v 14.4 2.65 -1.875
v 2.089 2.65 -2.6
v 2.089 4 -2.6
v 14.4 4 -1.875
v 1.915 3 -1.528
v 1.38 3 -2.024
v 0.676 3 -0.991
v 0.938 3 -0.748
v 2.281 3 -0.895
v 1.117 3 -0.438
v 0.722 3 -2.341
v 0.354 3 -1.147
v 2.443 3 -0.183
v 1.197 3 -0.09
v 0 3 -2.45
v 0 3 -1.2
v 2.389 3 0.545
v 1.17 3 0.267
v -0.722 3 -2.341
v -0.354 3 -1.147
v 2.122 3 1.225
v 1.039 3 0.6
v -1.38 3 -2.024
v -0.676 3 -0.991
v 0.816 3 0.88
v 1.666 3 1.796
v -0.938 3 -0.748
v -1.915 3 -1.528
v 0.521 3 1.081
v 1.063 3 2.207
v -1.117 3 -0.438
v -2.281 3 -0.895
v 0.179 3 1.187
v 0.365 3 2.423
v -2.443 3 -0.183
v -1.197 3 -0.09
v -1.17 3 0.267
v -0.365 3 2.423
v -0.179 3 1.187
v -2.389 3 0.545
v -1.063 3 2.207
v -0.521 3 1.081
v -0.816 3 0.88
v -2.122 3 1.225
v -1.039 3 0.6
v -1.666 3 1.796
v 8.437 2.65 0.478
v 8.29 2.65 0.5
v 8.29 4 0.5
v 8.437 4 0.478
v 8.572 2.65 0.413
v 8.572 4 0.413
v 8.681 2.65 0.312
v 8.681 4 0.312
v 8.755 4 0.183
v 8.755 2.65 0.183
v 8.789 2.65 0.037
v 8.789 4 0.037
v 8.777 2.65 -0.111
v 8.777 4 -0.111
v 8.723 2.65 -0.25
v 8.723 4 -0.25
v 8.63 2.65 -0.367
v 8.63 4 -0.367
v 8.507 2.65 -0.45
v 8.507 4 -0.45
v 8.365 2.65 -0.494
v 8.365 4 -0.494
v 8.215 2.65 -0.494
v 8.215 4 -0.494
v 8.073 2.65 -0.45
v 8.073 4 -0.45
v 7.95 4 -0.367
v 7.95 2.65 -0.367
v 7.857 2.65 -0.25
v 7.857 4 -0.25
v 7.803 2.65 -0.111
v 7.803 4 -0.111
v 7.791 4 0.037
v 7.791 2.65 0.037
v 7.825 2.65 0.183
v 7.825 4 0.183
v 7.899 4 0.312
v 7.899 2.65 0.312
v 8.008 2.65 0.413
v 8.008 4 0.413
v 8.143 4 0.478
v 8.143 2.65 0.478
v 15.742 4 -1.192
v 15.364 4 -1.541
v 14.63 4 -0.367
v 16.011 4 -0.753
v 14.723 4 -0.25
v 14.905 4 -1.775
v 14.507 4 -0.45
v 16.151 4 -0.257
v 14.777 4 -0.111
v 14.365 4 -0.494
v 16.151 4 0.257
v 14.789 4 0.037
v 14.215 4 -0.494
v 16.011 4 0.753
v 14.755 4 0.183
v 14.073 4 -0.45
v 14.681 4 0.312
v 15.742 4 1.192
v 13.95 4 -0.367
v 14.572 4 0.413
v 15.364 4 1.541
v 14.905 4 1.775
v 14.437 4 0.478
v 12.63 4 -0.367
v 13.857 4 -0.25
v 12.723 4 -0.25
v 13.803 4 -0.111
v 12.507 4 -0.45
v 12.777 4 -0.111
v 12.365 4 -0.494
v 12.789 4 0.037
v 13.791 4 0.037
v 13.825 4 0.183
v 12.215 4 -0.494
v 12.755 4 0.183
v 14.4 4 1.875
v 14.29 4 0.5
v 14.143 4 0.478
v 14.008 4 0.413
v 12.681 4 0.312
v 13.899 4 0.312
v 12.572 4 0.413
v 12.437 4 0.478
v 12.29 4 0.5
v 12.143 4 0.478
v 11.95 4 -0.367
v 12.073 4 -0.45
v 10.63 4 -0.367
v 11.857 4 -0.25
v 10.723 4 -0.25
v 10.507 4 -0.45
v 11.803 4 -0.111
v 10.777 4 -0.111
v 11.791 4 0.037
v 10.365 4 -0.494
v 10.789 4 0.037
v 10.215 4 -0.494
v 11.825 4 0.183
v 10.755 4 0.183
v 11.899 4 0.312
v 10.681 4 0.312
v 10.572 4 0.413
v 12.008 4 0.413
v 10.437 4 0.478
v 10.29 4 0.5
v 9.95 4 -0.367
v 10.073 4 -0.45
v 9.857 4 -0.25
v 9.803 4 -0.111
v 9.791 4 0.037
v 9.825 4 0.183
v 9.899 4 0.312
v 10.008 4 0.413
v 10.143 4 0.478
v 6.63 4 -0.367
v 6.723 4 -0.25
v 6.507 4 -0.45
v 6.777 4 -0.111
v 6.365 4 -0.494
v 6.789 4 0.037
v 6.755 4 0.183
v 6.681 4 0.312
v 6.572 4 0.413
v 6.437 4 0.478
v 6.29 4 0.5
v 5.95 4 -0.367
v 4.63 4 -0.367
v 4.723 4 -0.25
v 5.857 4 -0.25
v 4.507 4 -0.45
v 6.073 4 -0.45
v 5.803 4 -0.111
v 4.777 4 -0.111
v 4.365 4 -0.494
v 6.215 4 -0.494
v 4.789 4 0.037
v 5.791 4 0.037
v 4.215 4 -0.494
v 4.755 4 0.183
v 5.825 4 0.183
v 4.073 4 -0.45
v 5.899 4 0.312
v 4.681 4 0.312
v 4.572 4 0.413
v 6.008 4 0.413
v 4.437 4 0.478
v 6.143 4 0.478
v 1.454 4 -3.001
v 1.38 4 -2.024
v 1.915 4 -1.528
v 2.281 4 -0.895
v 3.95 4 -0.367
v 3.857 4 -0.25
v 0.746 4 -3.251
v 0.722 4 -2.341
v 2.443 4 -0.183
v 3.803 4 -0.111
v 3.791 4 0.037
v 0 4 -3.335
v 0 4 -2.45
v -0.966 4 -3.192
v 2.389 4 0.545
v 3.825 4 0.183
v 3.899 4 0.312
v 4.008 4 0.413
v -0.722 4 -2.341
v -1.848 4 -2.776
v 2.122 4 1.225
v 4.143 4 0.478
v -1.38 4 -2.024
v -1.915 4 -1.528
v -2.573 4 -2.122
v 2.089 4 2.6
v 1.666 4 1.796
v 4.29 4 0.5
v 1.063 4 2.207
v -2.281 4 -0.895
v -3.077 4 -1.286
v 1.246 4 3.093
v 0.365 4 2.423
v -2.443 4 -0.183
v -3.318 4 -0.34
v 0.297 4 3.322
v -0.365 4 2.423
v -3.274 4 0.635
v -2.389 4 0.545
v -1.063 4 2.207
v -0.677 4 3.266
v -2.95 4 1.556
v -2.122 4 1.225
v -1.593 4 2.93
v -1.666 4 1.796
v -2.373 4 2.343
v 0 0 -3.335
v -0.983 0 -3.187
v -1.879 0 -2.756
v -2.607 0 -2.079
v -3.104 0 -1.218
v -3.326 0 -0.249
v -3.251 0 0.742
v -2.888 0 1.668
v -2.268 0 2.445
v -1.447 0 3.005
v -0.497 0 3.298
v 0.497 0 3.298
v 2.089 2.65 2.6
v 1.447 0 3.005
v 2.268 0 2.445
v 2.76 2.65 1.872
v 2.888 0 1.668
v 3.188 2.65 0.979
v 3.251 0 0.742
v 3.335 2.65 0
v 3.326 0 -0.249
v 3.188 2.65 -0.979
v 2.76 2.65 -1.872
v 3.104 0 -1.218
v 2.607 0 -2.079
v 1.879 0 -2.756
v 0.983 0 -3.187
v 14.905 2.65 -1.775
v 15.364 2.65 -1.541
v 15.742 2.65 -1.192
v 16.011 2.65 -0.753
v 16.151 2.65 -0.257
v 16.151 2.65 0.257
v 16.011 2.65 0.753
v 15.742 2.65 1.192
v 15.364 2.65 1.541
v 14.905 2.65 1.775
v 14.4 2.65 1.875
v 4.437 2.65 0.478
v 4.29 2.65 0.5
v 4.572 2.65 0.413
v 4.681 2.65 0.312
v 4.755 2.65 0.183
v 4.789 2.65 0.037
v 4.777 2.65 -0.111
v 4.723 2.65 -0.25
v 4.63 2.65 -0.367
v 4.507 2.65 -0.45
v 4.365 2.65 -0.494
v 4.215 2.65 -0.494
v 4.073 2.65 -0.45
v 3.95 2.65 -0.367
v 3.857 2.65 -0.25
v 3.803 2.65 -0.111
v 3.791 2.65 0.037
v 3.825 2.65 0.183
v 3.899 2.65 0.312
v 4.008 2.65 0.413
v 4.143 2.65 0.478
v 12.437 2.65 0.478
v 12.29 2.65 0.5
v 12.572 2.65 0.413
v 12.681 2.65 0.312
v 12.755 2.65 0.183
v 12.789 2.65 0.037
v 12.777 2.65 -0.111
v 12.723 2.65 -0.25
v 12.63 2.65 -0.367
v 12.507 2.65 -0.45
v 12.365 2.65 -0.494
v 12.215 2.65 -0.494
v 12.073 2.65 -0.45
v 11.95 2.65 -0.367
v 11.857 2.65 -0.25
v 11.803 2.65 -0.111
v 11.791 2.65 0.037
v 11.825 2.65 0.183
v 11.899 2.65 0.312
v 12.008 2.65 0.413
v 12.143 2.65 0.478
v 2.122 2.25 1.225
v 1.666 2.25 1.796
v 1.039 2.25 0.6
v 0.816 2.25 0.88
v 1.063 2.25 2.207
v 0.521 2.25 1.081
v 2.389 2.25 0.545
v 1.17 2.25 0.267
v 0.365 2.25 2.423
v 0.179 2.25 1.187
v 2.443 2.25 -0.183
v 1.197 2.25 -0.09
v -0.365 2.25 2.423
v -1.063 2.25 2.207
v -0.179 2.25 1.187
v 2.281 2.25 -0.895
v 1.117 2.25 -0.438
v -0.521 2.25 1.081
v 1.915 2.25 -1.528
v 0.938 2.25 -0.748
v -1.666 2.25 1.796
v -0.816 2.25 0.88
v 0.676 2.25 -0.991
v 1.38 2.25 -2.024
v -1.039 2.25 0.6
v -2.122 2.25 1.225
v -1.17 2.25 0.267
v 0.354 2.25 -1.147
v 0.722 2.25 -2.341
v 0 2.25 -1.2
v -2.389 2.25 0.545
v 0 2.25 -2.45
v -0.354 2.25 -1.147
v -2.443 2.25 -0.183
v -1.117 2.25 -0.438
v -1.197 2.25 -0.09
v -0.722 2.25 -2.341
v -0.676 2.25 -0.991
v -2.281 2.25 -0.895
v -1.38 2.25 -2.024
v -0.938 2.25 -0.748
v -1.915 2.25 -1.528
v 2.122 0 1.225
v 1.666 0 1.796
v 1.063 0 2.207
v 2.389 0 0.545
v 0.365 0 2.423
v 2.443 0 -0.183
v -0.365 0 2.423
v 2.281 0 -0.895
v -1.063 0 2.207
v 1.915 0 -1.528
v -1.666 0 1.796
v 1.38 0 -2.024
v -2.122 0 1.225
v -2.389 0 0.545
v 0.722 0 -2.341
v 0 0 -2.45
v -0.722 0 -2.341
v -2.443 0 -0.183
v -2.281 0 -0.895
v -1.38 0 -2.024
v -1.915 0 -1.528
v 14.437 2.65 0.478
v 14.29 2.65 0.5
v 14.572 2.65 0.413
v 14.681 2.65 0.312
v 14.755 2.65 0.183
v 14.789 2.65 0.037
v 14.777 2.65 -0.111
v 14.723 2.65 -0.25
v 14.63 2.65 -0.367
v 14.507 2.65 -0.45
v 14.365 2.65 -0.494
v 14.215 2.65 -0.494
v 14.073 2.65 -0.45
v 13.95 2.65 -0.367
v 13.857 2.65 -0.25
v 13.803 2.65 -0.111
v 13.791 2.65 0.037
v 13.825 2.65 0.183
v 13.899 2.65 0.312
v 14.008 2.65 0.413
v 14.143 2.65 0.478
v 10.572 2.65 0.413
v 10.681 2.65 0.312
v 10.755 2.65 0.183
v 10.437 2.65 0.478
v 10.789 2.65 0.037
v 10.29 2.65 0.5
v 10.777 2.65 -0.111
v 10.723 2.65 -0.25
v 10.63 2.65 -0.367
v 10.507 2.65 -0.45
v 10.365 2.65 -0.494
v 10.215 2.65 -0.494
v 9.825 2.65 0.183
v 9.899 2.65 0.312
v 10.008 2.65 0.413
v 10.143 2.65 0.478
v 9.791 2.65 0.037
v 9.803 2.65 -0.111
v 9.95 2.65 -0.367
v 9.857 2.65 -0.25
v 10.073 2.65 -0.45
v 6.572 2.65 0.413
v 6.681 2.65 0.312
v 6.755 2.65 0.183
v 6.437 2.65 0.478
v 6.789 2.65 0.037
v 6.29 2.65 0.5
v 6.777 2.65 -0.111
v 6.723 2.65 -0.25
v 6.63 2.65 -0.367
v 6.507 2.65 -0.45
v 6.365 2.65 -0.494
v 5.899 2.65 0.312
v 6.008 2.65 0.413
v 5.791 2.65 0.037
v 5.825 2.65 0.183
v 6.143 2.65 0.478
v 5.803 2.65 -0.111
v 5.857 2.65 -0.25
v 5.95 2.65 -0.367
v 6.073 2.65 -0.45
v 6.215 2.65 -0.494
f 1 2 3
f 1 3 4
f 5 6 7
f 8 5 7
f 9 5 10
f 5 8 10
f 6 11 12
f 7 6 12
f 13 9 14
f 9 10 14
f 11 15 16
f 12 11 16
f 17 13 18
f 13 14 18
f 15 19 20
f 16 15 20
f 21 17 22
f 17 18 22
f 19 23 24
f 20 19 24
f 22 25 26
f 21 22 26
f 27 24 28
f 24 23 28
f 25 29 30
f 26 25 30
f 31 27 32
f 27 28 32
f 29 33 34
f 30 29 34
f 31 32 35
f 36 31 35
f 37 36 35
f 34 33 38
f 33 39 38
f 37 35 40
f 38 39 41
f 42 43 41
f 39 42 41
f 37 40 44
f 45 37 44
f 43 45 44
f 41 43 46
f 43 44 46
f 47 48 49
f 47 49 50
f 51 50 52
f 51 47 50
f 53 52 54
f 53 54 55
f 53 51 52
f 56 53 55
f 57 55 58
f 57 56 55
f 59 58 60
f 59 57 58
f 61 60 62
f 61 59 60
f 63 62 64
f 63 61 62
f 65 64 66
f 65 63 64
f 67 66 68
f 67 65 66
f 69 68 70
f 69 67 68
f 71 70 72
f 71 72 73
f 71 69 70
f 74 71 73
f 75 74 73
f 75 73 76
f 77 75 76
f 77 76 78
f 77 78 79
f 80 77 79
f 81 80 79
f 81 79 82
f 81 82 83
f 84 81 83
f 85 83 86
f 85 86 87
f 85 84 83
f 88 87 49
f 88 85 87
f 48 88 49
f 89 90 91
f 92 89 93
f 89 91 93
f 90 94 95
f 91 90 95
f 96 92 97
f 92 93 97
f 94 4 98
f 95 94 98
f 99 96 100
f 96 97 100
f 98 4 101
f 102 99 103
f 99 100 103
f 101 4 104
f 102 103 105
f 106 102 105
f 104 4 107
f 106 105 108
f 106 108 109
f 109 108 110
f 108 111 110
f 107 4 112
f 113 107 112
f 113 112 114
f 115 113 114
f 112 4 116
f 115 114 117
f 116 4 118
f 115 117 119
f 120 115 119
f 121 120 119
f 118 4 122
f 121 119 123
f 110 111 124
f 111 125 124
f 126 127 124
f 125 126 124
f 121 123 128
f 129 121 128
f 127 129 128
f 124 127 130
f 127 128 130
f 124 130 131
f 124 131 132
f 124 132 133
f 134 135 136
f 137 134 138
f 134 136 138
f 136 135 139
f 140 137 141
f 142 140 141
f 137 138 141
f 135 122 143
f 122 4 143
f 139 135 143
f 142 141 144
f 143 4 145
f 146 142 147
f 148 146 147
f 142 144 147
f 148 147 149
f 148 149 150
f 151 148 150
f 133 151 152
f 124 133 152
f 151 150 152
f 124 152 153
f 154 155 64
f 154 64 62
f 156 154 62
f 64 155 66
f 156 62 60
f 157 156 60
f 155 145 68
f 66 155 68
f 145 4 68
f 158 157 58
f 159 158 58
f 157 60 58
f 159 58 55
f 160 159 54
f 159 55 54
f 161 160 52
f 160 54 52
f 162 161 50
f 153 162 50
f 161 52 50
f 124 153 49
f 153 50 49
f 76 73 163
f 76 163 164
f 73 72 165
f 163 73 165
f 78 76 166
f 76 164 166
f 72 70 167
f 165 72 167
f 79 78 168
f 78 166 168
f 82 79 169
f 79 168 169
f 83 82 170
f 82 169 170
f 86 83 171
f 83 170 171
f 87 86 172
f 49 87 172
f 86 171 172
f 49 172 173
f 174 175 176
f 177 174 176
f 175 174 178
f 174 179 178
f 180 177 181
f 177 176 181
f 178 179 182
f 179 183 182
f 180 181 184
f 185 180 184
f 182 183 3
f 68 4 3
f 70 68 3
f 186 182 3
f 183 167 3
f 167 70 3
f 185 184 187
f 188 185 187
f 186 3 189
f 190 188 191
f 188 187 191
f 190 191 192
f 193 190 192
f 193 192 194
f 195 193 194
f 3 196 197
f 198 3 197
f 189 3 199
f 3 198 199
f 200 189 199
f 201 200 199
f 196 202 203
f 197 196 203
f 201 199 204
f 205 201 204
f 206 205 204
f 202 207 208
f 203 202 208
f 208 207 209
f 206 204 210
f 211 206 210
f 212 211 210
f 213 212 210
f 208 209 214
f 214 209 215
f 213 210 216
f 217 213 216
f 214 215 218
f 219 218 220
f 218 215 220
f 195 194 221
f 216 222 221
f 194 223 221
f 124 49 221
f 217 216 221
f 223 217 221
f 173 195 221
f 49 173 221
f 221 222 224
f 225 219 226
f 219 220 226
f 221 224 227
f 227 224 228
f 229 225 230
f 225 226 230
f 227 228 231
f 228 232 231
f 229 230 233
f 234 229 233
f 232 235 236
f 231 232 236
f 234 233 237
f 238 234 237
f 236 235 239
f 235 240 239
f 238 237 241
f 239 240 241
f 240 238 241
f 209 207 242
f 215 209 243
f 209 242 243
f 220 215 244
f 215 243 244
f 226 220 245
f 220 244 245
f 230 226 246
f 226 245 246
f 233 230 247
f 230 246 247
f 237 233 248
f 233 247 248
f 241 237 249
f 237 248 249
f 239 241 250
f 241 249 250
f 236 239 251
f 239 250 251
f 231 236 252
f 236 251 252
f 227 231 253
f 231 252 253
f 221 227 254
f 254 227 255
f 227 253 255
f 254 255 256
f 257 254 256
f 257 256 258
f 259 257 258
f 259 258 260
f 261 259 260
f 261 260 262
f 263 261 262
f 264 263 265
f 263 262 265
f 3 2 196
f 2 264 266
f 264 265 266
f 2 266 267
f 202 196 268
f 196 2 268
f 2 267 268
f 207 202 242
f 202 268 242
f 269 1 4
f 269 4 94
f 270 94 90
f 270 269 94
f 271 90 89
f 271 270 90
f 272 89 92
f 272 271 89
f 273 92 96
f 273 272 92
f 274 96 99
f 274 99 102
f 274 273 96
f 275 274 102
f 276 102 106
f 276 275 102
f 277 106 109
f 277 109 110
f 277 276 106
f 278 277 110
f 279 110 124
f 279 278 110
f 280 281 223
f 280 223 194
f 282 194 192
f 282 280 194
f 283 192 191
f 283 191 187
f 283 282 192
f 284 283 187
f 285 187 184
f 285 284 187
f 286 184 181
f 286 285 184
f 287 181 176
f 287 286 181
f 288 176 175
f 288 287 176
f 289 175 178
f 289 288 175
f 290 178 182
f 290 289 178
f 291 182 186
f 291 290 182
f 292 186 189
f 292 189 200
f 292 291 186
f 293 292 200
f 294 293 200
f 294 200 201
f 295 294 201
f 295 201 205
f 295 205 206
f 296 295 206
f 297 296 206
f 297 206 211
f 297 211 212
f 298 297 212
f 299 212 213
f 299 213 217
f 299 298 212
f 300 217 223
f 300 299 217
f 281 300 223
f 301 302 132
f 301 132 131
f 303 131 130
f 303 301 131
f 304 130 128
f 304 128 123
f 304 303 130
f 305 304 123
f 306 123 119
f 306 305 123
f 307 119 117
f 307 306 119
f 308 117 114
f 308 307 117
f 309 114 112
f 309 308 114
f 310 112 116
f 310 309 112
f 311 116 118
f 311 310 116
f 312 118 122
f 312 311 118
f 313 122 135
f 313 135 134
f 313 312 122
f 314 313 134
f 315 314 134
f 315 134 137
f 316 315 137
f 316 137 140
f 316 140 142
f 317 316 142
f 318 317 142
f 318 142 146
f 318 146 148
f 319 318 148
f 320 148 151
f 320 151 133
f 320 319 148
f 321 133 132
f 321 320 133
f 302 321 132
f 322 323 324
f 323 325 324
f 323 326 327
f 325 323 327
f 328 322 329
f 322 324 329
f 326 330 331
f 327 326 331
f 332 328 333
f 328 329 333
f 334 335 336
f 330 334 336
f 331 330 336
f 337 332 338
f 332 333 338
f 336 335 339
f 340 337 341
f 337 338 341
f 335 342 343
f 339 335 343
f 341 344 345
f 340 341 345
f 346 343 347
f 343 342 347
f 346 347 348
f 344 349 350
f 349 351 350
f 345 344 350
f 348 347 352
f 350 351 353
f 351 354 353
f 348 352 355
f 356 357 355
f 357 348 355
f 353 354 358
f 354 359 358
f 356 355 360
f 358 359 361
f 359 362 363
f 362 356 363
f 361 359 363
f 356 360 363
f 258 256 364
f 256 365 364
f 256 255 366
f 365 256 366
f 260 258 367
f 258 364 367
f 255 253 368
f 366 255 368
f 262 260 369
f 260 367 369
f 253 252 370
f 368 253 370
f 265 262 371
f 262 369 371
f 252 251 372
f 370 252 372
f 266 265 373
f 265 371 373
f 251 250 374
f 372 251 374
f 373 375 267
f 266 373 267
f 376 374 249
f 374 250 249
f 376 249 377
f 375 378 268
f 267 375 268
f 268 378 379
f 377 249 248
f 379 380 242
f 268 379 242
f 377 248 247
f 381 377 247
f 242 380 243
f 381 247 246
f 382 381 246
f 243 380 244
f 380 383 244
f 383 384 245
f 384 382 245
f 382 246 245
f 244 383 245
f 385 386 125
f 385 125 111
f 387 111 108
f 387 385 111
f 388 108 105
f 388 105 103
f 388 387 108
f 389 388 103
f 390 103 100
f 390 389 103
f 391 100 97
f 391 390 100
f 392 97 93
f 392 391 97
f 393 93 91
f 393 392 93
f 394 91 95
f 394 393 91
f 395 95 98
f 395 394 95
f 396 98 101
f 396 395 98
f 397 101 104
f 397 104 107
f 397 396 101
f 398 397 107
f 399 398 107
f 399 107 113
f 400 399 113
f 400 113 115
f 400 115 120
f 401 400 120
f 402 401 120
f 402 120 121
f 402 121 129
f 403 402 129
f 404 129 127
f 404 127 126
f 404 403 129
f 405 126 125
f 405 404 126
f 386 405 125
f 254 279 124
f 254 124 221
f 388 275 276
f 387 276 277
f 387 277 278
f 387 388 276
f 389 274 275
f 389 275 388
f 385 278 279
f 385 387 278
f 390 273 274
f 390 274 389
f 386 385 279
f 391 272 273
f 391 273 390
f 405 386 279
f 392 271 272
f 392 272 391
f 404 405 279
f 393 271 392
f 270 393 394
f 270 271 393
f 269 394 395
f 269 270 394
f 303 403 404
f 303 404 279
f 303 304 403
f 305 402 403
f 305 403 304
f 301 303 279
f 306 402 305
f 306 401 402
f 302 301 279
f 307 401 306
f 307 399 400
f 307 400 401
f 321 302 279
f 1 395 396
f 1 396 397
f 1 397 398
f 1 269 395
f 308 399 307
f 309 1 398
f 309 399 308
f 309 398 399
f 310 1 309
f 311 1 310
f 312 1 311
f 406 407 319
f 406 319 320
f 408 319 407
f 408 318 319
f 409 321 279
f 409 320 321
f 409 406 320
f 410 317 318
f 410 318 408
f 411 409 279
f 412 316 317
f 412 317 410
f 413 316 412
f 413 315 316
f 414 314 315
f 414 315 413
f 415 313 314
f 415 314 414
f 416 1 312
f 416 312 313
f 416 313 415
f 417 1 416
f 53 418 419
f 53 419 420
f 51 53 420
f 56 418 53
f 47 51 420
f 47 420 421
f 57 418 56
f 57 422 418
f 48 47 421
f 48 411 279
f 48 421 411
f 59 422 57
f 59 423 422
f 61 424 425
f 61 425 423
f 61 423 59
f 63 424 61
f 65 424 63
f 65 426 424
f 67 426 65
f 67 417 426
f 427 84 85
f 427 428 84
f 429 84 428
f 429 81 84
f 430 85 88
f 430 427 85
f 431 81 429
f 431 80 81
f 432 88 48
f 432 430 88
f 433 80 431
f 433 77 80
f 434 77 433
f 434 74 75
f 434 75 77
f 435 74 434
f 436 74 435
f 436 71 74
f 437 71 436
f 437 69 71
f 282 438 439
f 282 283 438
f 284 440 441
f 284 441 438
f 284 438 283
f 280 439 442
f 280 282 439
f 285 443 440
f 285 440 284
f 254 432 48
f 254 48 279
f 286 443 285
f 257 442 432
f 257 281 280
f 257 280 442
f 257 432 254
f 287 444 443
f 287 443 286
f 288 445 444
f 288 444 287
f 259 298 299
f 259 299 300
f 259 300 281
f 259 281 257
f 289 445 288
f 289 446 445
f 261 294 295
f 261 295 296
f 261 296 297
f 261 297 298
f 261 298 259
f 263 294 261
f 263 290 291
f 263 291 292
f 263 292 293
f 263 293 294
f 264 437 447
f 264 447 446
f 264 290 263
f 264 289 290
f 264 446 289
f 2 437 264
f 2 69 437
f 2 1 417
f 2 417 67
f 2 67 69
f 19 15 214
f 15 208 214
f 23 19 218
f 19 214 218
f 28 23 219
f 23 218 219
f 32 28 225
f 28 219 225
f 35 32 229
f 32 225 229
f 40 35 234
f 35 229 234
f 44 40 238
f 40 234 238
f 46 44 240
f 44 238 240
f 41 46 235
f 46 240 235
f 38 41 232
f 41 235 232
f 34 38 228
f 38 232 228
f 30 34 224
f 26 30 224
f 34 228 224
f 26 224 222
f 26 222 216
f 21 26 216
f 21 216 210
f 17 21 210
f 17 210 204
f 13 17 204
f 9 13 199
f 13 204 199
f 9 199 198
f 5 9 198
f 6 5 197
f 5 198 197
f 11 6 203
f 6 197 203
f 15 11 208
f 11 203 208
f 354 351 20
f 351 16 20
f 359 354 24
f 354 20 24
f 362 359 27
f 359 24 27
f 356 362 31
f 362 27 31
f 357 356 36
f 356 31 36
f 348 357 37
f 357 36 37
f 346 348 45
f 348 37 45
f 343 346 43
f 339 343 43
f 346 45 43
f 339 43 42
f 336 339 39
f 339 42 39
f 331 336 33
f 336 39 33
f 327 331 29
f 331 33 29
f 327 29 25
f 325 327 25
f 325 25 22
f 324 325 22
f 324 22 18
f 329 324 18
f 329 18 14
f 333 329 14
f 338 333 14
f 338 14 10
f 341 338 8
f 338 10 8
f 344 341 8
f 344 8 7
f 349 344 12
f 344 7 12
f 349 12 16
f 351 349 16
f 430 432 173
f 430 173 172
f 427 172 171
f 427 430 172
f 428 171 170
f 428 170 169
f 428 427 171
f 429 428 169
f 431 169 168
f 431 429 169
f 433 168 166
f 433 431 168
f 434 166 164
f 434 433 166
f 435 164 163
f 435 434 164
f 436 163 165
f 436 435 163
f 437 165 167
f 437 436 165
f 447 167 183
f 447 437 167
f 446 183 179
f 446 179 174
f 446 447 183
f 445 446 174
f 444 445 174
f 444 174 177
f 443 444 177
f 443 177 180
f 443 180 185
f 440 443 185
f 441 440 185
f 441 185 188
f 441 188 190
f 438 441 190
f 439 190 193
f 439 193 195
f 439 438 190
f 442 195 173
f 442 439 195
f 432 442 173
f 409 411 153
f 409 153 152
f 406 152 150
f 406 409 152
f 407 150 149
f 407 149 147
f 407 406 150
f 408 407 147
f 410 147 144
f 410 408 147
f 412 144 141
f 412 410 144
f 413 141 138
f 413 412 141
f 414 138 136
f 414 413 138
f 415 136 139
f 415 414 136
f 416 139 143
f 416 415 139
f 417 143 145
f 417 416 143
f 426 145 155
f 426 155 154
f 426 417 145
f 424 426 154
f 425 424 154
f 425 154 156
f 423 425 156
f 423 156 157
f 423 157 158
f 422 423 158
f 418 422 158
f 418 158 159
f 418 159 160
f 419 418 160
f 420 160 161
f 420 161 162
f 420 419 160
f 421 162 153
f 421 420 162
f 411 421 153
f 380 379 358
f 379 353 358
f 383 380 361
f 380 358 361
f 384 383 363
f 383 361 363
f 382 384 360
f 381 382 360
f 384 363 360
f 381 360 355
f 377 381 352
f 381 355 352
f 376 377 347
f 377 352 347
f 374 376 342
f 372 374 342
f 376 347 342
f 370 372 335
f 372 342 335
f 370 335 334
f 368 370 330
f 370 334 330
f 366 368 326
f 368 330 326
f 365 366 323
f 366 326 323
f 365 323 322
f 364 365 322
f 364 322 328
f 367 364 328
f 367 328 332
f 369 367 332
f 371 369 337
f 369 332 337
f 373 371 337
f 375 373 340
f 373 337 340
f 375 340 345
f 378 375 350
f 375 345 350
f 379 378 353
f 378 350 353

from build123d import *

# Parameters (mm, degrees)
BOSS_EXTRUDE1_START = -1.35
SKETCH3_R           = 0.5
BOSS_EXTRUDE1_DEPTH = 1.35


with BuildPart() as part:
    # Sketch2 → Revolve1 (revolve)
    with BuildSketch(Plane.XY, mode=Mode.PRIVATE) as revolve1_sk:
        Polygon((2.45, 0), (2.45, 2.25), (1.2, 2.25), (1.2, 3), (2.45, 3), (2.45, 4), (3.335, 4), (3.335, 0), align=None)
    revolve(revolve1_sk.sketch.rotate(Axis((0, 0, 0), (0, 1, 0)), 90), axis=Axis((0, 0, 0), (0, 1, 0)))

    # Sketch3 → Boss-Extrude1 (add)
    with BuildSketch(Plane(origin=(0, 4, 0), x_dir=(1, 0, 0), z_dir=(0, 1, 0)).offset(BOSS_EXTRUDE1_START)):
        with BuildLine():
            Line((2.088594025, 2.6), (14.400412206, 1.875))
            ThreePointArc((14.400412206, 1.875), (16.168248081, 0), (14.400412206, -1.875))
            Line((14.400412206, -1.875), (2.088594025, -2.6))
            ThreePointArc((2.088594025, -2.6), (3.335, 0), (2.088594025, 2.6))
        make_face()
        with Locations(Location((14.29, 0, 0), (0, 0, 270))):
            Circle(SKETCH3_R, mode=Mode.SUBTRACT)
        with Locations(Location((12.29, 0, 0), (0, 0, 270))):
            Circle(SKETCH3_R, mode=Mode.SUBTRACT)
        with Locations(Location((10.29, 0, 0), (0, 0, 270))):
            Circle(SKETCH3_R, mode=Mode.SUBTRACT)
        with Locations(Location((8.29, 0, 0), (0, 0, 270))):
            Circle(SKETCH3_R, mode=Mode.SUBTRACT)
        with Locations(Location((6.29, 0, 0), (0, 0, 270))):
            Circle(SKETCH3_R, mode=Mode.SUBTRACT)
        with Locations(Location((4.29, 0, 0), (0, 0, 270))):
            Circle(SKETCH3_R, mode=Mode.SUBTRACT)
    extrude(amount=BOSS_EXTRUDE1_DEPTH)


solid = part.part
